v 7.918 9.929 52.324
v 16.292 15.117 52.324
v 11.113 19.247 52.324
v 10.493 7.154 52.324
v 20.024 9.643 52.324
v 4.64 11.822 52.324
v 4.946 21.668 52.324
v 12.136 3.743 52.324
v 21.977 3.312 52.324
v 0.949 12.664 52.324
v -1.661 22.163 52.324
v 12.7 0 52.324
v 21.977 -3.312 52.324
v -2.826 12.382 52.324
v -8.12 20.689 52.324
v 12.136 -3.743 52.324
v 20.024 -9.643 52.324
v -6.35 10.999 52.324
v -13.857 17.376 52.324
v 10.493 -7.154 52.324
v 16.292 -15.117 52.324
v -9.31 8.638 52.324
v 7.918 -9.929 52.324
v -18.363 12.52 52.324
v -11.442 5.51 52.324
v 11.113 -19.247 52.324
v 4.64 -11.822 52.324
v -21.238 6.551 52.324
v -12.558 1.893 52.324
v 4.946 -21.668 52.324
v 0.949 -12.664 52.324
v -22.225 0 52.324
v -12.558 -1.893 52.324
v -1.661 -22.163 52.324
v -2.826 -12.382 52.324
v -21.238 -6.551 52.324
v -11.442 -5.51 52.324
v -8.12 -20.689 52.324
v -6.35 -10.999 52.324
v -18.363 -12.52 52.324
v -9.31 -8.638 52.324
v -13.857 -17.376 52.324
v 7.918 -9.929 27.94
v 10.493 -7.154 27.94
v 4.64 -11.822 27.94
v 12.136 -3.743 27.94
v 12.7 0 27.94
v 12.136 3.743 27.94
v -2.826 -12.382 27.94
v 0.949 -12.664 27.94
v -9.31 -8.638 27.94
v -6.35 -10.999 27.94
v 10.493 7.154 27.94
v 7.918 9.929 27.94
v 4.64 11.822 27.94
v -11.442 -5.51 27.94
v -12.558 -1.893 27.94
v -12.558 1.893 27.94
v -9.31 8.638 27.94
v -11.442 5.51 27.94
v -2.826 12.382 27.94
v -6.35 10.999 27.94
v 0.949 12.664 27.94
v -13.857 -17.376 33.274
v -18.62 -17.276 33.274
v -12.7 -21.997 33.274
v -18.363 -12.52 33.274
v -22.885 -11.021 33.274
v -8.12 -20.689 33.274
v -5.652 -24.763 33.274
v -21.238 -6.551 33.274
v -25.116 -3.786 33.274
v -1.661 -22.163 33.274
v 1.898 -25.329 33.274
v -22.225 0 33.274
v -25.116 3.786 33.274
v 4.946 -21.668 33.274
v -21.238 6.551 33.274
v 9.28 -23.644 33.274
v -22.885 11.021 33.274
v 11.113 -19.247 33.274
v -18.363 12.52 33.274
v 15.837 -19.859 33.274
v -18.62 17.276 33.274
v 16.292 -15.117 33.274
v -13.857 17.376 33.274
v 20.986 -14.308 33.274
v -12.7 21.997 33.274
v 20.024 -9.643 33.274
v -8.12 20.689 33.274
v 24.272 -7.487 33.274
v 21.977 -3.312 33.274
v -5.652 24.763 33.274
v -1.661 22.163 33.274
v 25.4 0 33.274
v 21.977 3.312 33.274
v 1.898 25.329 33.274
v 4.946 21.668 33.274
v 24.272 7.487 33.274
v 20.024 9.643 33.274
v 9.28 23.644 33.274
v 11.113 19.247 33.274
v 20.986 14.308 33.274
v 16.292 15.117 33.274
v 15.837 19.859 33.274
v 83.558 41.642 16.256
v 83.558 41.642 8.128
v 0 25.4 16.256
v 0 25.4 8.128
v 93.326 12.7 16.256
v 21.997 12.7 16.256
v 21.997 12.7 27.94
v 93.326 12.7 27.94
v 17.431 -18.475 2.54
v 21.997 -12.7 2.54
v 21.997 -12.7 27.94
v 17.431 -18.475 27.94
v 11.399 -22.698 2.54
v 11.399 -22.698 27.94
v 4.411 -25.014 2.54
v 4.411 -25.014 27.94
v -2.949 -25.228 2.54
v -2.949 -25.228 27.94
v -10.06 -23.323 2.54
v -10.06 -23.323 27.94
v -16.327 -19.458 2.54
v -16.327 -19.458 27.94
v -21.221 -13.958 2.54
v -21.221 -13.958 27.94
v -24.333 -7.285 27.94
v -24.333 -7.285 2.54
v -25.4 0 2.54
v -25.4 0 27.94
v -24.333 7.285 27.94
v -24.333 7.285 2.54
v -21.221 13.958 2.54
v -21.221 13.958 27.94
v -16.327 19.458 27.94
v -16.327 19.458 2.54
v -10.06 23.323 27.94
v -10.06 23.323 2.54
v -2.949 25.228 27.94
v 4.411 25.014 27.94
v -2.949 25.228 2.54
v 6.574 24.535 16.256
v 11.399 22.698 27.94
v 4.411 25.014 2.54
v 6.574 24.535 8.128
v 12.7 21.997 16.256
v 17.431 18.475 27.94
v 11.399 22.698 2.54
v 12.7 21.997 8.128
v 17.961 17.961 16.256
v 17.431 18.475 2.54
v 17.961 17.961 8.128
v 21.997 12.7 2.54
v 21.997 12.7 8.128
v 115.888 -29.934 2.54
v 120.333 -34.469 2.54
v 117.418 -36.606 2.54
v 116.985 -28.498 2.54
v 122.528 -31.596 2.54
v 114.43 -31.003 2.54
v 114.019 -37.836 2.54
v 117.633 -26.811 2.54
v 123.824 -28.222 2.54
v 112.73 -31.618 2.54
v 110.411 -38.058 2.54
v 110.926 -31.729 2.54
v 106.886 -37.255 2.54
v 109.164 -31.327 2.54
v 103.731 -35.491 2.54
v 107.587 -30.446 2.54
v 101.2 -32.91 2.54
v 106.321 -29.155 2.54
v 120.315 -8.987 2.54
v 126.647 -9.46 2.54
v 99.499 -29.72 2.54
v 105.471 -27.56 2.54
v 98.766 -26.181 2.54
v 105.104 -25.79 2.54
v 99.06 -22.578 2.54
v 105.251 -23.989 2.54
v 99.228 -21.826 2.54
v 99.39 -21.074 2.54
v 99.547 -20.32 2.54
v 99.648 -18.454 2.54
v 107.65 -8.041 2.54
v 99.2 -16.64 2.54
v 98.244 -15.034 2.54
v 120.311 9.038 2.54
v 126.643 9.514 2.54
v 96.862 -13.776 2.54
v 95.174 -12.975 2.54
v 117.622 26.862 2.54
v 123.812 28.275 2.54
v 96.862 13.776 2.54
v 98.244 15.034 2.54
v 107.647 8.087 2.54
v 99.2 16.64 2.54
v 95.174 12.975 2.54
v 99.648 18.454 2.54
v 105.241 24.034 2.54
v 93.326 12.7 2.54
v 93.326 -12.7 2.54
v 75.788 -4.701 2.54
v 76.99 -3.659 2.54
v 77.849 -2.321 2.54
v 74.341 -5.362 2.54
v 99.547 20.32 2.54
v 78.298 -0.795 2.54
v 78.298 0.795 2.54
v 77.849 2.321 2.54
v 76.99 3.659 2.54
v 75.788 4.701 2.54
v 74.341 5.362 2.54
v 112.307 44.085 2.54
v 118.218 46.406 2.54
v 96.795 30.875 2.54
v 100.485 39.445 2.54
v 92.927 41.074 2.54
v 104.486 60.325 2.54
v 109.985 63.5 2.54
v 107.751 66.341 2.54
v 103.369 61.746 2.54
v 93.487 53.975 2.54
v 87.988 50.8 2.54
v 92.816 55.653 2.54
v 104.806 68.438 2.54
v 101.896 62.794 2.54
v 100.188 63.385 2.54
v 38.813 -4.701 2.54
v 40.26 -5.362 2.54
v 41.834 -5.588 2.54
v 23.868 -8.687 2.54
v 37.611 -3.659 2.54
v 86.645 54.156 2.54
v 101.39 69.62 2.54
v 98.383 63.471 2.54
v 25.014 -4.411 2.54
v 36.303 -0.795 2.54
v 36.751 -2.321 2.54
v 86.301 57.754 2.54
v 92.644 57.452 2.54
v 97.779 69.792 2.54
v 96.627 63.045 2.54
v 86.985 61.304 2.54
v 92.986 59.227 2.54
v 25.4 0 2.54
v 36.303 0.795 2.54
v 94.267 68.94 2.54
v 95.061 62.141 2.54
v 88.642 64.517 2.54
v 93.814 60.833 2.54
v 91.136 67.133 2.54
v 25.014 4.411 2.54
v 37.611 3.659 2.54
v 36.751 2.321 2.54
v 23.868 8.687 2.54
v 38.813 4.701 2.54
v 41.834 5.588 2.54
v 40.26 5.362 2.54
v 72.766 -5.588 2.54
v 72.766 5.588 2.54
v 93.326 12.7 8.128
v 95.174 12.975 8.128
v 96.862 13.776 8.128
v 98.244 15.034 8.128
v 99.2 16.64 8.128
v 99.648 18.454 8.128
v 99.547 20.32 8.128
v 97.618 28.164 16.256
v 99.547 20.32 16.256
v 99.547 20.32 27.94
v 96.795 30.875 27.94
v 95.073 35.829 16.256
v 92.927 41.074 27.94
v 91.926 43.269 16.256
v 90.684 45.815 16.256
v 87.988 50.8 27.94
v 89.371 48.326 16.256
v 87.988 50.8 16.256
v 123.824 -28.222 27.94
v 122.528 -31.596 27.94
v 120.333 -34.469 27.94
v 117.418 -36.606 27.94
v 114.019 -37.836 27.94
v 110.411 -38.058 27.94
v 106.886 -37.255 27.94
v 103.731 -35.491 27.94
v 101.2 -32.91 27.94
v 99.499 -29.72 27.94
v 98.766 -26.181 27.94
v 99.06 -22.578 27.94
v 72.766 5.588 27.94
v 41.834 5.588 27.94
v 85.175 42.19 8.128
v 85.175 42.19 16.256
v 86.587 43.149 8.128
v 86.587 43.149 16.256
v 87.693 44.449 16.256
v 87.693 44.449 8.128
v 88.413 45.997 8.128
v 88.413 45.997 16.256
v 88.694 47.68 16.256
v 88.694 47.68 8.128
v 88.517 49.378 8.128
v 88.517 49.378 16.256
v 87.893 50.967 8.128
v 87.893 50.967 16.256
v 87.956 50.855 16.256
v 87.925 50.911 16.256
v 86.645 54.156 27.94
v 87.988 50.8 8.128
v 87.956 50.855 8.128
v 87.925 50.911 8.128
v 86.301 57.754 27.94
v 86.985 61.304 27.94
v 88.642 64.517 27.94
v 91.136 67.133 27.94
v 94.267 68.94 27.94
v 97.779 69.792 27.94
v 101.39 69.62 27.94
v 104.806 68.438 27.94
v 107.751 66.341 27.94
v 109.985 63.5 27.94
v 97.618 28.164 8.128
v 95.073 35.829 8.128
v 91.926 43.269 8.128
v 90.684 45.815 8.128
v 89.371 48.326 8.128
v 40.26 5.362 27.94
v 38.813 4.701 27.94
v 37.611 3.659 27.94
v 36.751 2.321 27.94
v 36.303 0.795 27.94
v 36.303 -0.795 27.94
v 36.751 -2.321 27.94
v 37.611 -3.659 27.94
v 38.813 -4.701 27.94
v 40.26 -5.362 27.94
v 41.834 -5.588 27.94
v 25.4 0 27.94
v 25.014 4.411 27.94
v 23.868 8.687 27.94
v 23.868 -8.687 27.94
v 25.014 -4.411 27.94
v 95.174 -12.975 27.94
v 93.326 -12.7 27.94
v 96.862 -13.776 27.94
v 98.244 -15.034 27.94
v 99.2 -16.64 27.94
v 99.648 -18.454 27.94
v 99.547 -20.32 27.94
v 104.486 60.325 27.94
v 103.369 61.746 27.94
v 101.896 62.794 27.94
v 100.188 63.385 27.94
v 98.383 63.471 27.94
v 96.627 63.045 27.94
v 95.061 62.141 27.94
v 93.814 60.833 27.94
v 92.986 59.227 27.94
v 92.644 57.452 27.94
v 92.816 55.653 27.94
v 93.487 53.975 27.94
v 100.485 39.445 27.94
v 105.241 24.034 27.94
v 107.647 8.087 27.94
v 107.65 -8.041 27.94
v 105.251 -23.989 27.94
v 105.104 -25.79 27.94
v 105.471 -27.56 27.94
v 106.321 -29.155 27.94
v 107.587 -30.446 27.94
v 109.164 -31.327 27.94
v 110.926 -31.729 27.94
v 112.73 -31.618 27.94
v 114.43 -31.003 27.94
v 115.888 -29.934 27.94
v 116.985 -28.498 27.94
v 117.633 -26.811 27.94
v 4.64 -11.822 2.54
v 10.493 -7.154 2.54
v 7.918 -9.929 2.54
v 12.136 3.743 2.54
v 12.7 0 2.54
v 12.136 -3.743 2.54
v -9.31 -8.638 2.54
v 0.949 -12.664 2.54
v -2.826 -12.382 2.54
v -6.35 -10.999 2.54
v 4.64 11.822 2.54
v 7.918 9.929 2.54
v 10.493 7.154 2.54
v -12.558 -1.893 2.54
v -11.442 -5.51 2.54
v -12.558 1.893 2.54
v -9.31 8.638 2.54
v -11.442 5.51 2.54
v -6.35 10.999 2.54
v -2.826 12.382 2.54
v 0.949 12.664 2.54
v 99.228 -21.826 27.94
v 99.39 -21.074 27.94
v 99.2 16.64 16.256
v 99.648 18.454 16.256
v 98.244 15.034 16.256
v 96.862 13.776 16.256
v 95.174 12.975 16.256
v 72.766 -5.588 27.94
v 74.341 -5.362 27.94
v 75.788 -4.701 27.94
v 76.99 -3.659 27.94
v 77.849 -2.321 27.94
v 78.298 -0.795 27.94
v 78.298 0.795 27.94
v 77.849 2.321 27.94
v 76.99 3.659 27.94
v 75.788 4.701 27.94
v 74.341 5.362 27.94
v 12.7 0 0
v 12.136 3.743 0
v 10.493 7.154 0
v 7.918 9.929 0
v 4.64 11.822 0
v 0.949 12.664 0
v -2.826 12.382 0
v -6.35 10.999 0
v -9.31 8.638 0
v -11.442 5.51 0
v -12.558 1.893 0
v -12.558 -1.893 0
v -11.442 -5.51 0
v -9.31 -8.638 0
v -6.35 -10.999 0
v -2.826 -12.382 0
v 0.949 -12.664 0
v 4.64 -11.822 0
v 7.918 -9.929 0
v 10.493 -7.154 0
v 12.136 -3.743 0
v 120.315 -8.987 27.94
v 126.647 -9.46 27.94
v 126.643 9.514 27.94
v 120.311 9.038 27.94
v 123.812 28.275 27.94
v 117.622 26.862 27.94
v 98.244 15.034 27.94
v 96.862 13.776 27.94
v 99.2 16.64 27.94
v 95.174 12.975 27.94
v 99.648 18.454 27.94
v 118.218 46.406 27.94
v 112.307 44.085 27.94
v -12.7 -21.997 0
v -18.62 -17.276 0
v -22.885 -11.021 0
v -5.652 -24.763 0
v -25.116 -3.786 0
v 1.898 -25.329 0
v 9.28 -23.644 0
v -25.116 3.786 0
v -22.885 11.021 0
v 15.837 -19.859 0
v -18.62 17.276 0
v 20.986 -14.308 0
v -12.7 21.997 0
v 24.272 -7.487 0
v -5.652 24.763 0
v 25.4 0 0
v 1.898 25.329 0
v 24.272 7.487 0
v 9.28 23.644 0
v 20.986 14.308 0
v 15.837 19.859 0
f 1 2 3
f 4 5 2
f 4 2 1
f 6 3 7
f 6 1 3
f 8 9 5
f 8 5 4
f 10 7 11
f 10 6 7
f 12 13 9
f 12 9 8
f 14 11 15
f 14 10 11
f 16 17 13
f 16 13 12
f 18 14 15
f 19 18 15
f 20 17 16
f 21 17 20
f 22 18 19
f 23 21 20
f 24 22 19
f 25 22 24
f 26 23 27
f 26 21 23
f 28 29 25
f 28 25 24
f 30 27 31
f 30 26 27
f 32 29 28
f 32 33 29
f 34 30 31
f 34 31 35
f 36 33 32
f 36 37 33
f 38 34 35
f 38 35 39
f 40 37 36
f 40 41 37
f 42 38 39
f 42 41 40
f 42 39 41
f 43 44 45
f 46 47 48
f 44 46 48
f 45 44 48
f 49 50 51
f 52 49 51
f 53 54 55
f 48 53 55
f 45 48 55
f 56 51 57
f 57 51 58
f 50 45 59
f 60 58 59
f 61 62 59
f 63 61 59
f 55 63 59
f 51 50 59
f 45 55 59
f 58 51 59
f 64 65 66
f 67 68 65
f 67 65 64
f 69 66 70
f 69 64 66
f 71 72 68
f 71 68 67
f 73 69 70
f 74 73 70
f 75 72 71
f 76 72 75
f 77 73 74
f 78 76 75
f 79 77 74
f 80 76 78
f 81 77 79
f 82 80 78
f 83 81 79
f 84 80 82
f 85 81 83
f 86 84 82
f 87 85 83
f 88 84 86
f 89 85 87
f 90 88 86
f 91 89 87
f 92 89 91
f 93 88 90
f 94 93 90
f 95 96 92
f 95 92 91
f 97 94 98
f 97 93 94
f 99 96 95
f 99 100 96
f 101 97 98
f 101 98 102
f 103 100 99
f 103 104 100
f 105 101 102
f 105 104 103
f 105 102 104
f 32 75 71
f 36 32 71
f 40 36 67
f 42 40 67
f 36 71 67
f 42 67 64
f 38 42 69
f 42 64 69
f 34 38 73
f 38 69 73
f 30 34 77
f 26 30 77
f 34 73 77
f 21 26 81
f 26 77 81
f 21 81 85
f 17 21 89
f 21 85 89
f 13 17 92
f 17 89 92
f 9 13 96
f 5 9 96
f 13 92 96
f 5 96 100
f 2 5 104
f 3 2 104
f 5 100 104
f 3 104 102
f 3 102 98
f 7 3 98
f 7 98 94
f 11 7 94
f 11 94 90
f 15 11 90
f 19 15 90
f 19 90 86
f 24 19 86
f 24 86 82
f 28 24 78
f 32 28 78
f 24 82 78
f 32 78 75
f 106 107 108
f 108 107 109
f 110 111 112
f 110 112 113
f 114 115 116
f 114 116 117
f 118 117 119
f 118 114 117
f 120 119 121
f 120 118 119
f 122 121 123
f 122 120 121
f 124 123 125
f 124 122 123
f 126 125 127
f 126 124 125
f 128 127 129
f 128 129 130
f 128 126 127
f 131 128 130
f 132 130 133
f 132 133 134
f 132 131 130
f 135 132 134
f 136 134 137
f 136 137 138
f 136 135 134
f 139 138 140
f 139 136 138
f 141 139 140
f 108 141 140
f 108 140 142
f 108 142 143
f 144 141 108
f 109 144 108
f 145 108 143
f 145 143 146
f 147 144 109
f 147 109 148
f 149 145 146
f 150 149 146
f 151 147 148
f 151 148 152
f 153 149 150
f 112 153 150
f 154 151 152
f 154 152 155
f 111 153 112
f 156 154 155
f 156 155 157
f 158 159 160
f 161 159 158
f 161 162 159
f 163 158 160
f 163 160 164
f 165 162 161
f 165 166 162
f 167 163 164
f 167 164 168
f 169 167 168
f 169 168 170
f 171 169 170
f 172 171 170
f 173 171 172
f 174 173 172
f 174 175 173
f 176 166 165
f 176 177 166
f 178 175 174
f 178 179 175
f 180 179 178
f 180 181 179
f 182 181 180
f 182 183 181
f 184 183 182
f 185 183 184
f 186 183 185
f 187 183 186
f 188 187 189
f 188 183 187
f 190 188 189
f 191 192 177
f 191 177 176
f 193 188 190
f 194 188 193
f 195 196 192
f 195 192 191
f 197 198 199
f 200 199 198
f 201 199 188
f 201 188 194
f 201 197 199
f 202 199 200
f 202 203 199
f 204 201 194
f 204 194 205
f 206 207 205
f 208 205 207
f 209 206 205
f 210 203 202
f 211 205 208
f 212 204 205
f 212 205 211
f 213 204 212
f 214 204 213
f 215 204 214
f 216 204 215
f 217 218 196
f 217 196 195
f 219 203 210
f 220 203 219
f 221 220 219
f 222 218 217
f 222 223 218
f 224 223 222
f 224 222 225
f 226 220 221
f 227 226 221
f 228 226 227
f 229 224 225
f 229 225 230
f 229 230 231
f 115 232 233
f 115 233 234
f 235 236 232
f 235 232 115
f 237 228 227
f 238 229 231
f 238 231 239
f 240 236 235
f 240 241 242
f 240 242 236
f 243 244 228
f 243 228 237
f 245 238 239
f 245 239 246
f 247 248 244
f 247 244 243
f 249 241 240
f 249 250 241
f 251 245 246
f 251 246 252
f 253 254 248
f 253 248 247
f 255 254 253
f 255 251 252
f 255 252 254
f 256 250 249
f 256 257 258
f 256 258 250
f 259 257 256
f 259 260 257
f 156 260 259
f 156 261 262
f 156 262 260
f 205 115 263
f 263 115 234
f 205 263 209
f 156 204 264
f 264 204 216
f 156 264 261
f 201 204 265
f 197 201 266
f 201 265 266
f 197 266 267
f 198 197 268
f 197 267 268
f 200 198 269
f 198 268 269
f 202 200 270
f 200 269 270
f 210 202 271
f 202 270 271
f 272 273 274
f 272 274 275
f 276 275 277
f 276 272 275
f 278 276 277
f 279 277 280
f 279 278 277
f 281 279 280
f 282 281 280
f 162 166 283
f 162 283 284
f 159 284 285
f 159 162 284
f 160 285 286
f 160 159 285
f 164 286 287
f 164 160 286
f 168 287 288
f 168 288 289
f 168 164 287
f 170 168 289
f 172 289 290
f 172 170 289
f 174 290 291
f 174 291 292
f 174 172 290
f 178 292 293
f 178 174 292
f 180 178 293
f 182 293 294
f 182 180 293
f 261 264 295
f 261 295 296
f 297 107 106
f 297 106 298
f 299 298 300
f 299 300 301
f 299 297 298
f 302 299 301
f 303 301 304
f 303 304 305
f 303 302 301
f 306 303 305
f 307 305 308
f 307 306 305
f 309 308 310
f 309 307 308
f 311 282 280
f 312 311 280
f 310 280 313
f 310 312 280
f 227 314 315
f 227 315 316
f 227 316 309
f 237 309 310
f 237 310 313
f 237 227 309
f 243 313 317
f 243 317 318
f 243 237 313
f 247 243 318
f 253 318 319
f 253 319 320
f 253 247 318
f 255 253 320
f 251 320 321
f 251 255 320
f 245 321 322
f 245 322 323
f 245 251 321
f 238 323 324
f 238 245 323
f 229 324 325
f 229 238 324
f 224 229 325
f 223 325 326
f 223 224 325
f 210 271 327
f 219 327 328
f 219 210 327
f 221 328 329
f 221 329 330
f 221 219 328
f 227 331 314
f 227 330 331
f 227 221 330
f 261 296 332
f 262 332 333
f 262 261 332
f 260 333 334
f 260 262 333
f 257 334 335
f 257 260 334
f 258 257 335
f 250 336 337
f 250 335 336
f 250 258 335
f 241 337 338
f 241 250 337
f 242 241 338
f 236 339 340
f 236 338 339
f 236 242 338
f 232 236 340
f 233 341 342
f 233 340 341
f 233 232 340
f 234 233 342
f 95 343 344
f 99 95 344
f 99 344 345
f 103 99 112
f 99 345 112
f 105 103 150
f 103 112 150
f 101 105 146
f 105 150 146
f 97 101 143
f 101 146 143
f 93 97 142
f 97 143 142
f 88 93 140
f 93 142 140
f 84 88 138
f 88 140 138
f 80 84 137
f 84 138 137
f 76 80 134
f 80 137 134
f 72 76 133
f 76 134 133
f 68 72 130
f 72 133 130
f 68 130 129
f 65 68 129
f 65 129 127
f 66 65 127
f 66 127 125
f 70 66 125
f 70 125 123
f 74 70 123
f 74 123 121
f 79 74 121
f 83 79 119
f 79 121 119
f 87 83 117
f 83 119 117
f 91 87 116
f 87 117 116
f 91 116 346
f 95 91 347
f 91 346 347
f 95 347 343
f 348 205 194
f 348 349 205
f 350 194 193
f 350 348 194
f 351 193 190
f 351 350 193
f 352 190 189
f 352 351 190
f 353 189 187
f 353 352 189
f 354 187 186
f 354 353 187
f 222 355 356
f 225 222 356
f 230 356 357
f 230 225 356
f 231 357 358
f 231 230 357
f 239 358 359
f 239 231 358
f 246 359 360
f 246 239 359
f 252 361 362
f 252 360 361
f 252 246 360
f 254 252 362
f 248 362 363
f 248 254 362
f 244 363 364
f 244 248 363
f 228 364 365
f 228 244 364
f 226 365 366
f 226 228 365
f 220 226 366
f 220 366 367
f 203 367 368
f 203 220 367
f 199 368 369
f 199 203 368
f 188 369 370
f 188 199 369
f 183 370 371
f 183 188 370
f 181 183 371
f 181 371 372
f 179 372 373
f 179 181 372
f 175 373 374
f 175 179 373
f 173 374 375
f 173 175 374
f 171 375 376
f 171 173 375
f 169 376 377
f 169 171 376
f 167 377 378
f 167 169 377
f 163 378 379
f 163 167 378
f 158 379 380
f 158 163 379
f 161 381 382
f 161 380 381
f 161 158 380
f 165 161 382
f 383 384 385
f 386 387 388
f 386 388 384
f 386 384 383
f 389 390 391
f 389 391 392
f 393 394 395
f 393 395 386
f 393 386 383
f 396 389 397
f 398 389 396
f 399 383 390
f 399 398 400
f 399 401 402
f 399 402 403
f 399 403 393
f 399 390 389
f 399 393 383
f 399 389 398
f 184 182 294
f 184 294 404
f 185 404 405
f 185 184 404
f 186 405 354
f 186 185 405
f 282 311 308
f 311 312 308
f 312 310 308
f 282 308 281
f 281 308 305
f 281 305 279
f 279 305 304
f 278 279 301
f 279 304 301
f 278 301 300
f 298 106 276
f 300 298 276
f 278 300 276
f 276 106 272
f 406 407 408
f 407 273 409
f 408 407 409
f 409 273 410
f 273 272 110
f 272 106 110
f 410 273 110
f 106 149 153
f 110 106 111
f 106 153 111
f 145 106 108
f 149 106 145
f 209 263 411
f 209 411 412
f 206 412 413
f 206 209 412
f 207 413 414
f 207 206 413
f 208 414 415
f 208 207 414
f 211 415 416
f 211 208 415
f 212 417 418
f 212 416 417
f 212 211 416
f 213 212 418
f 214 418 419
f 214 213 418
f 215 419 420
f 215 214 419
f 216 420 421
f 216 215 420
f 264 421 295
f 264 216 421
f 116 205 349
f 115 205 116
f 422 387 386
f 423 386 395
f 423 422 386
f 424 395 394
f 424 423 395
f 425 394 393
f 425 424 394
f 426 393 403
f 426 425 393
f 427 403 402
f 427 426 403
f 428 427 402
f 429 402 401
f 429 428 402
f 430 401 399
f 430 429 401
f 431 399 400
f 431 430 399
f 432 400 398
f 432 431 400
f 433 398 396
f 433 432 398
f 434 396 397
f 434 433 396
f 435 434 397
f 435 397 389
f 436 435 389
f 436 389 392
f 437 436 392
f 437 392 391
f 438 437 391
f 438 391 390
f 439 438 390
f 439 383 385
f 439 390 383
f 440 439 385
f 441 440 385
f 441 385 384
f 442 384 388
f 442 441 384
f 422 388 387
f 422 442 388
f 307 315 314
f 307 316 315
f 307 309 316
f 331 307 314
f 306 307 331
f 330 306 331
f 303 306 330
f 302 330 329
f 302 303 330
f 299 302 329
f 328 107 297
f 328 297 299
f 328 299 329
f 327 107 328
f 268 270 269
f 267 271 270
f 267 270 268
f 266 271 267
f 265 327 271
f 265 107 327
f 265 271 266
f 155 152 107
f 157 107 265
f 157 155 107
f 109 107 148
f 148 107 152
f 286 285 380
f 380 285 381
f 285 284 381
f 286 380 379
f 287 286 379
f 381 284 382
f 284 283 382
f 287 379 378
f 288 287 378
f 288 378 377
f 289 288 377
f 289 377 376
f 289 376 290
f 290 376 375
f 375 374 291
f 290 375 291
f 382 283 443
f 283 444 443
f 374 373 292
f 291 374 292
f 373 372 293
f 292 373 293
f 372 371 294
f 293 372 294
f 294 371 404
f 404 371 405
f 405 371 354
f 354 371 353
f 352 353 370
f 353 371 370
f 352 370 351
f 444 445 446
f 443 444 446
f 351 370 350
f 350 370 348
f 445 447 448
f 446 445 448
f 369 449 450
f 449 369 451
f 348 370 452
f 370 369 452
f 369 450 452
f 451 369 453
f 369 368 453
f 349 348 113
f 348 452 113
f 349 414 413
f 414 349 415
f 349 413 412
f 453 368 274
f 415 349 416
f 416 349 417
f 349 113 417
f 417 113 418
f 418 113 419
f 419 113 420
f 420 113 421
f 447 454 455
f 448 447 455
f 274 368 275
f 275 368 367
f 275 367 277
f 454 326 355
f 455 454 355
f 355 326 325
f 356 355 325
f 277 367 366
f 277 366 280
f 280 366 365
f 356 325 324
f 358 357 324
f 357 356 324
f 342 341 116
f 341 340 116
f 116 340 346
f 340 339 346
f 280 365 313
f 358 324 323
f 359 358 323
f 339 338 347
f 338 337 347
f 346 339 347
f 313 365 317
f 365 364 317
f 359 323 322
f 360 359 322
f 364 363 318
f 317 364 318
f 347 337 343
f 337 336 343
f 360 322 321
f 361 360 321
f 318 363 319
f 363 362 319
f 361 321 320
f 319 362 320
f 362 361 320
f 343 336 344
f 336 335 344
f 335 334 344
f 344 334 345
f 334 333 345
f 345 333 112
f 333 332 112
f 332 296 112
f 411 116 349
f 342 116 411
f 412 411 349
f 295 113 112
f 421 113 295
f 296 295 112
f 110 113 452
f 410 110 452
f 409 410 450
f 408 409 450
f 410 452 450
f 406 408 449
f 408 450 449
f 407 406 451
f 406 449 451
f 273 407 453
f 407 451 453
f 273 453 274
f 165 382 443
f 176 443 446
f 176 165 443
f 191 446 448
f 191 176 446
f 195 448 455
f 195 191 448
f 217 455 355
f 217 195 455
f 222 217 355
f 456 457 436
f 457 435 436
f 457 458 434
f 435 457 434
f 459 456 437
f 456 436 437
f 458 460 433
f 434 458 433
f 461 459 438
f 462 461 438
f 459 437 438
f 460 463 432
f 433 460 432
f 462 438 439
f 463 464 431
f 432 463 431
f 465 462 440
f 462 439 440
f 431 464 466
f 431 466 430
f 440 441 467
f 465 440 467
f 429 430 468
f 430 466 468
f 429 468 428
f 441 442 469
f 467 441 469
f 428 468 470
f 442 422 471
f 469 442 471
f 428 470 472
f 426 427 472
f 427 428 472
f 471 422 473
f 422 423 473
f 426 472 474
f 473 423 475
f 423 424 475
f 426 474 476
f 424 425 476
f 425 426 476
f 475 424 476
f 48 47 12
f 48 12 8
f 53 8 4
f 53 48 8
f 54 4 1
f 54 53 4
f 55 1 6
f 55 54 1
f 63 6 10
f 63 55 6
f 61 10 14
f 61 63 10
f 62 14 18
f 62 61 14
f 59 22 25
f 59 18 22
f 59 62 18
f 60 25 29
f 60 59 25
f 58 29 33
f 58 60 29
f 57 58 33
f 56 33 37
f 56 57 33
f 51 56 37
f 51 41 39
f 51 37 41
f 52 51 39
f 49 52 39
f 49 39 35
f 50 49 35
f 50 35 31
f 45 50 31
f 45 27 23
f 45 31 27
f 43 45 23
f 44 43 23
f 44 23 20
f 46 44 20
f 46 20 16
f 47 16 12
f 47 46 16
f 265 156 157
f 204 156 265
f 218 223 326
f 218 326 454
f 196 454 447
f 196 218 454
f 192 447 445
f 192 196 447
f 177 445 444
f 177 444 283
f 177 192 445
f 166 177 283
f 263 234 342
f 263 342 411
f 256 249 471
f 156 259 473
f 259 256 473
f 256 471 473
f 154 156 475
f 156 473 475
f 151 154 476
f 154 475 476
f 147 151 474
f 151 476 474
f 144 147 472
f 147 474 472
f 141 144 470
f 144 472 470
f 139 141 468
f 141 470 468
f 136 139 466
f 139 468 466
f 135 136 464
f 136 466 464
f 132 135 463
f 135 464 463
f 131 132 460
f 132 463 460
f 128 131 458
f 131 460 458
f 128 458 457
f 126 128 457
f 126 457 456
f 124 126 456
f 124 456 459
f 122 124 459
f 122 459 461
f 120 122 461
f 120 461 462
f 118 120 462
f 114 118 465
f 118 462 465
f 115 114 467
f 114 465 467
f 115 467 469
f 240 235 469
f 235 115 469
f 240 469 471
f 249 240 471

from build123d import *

# Parameters (mm, degrees)
SKETCH1_R           = 25.4
BOSS_EXTRUDE2_DEPTH = 33.274
SKETCH2_R           = 22.225
BOSS_EXTRUDE3_DEPTH = 19.05
SKETCH3_R           = 12.7
CUT_EXTRUDE1_DEPTH  = 64.467479673
BOSS_EXTRUDE4_DEPTH = 25.4
FILLET1_R           = 6.35
CUT_EXTRUDE3_DEPTH  = 154.252958066
BOSS_EXTRUDE5_DEPTH = 8.128
FILLET2_R           = 6.35


with BuildPart() as part:
    # Sketch1 → Boss-Extrude2 (new body)
    with BuildSketch(Plane.XY):
        Circle(SKETCH1_R)
    extrude(amount=BOSS_EXTRUDE2_DEPTH)

    # Sketch2 → Boss-Extrude3 (add)
    with BuildSketch(Plane.XY.offset(33.274)):
        with Locations(Location((0, 0, 0), (0, 0, 180))):
            Circle(SKETCH2_R)
    extrude(amount=BOSS_EXTRUDE3_DEPTH)

    # Sketch3 → Cut-Extrude1 (cut, through all)
    with BuildSketch(Plane.XY):
        Circle(SKETCH3_R)
    extrude(amount=CUT_EXTRUDE1_DEPTH, mode=Mode.SUBTRACT)

    # Sketch6 → Boss-Extrude4 (add)
    with BuildSketch(Plane.XY.offset(2.54)):
        with BuildLine():
            Line((21.997045256, 12.7), (100.803124952, 12.7))
            ThreePointArc((100.803124952, 12.7), (96.298711326, 32.390094118), (87.988181024, 50.8))
            ThreePointArc((87.988181024, 50.8), (92.636703653, 68.148522628), (109.985226281, 63.5))
            ThreePointArc((109.985226281, 63.5), (125.578613792, 18.9476056), (123.824497467, -28.222222222))
            ThreePointArc((123.824497467, -28.222222222), (108.619825498, -37.782449747), (99.059597973, -22.577777778))
            ThreePointArc((99.059597973, -22.577777778), (100.053333913, -17.660418251), (100.803124952, -12.7))
            Line((100.803124952, -12.7), (21.997045256, -12.7))
            ThreePointArc((21.997045256, -12.7), (-25.4, 0), (21.997045256, 12.7))
        make_face()
    extrude(amount=BOSS_EXTRUDE4_DEPTH)

    # Fillet1
    fillet1_edges = [part.edges().sort_by_distance(p)[0] for p in [
        (100.803124952, -12.7, 15.24),
        (100.803124952, 12.7, 15.24),
    ]]
    fillet(fillet1_edges, radius=FILLET1_R)

    # Sketch7 → Cut-Extrude3 (cut, through all)
    with BuildSketch(Plane.XY.offset(2.54)):
        with BuildLine():
            Line((41.834095467, -5.588), (72.766466105, -5.588))
            ThreePointArc((72.766466105, -5.588), (78.354466105, 0), (72.766466105, 5.588))
            Line((72.766466105, 5.588), (41.834095467, 5.588))
            ThreePointArc((41.834095467, 5.588), (36.246095467, 0), (41.834095467, -5.588))
        make_face()
        with BuildLine():
            ThreePointArc((117.633272593, -26.811111111), (119.299683103, 18.00022532), (104.485964967, 60.325))
            ThreePointArc((104.485964967, 60.325), (95.811703653, 62.649261314), (93.487442339, 53.975))
            ThreePointArc((93.487442339, 53.975), (106.741821724, 16.10546476), (105.250822847, -23.988888889))
            ThreePointArc((105.250822847, -23.988888889), (110.030936609, -31.591224873), (117.633272593, -26.811111111))
        make_face()
    extrude(amount=CUT_EXTRUDE3_DEPTH, mode=Mode.SUBTRACT)

    # Sketch8 → Boss-Extrude5 (add)
    with BuildSketch(Plane.XY.offset(8.128)):
        with BuildLine():
            Line((21.997045256, 12.7), (93.3255592, 12.7))
            ThreePointArc((93.3255592, 12.7), (98.24424805, 15.033907372), (99.547263147, 20.32))
            ThreePointArc((99.547263147, 20.32), (96.421789325, 32.021844783), (91.925992057, 43.268602754))
            Line((91.925992057, 43.268602754), (0, 25.4))
            ThreePointArc((0, 25.4), (12.7, 21.997045256), (21.997045256, 12.7))
        make_face()
    extrude(amount=BOSS_EXTRUDE5_DEPTH)

    # Fillet2
    # the kernel refuses this fillet: 6.35 mm, written as the material it adds along each edge
    with BuildSketch(Plane(origin=(91.925992057, 43.268602754, 8.128), x_dir=(-0.46401221312407714, 0.8858288017849137, 0), z_dir=(0, 0, 1))) as fillet2_piece_1:
        with BuildLine():
            CenterArc((8.525728186, 6.347859775), FILLET2_R, 163.353687105, 108.13393528)
            Line((2.441848203, 8.166899178), (1.833460205, 8.348803118))
            Line((1.833460205, 8.348803118), (-0.608387998, 0.18190394))
            Line((-0.608387998, 0.18190394), (-0.027038803, -0.634424072))
            ThreePointArc((-0.027038803, -0.634424072), (8.524799214, -0.640898159), (8.707065713, -0.634785977))
            Line((8.707065713, -0.634785977), (8.690580483, 0))
        make_face()
    extrude(amount=8.128)


solid = part.part
